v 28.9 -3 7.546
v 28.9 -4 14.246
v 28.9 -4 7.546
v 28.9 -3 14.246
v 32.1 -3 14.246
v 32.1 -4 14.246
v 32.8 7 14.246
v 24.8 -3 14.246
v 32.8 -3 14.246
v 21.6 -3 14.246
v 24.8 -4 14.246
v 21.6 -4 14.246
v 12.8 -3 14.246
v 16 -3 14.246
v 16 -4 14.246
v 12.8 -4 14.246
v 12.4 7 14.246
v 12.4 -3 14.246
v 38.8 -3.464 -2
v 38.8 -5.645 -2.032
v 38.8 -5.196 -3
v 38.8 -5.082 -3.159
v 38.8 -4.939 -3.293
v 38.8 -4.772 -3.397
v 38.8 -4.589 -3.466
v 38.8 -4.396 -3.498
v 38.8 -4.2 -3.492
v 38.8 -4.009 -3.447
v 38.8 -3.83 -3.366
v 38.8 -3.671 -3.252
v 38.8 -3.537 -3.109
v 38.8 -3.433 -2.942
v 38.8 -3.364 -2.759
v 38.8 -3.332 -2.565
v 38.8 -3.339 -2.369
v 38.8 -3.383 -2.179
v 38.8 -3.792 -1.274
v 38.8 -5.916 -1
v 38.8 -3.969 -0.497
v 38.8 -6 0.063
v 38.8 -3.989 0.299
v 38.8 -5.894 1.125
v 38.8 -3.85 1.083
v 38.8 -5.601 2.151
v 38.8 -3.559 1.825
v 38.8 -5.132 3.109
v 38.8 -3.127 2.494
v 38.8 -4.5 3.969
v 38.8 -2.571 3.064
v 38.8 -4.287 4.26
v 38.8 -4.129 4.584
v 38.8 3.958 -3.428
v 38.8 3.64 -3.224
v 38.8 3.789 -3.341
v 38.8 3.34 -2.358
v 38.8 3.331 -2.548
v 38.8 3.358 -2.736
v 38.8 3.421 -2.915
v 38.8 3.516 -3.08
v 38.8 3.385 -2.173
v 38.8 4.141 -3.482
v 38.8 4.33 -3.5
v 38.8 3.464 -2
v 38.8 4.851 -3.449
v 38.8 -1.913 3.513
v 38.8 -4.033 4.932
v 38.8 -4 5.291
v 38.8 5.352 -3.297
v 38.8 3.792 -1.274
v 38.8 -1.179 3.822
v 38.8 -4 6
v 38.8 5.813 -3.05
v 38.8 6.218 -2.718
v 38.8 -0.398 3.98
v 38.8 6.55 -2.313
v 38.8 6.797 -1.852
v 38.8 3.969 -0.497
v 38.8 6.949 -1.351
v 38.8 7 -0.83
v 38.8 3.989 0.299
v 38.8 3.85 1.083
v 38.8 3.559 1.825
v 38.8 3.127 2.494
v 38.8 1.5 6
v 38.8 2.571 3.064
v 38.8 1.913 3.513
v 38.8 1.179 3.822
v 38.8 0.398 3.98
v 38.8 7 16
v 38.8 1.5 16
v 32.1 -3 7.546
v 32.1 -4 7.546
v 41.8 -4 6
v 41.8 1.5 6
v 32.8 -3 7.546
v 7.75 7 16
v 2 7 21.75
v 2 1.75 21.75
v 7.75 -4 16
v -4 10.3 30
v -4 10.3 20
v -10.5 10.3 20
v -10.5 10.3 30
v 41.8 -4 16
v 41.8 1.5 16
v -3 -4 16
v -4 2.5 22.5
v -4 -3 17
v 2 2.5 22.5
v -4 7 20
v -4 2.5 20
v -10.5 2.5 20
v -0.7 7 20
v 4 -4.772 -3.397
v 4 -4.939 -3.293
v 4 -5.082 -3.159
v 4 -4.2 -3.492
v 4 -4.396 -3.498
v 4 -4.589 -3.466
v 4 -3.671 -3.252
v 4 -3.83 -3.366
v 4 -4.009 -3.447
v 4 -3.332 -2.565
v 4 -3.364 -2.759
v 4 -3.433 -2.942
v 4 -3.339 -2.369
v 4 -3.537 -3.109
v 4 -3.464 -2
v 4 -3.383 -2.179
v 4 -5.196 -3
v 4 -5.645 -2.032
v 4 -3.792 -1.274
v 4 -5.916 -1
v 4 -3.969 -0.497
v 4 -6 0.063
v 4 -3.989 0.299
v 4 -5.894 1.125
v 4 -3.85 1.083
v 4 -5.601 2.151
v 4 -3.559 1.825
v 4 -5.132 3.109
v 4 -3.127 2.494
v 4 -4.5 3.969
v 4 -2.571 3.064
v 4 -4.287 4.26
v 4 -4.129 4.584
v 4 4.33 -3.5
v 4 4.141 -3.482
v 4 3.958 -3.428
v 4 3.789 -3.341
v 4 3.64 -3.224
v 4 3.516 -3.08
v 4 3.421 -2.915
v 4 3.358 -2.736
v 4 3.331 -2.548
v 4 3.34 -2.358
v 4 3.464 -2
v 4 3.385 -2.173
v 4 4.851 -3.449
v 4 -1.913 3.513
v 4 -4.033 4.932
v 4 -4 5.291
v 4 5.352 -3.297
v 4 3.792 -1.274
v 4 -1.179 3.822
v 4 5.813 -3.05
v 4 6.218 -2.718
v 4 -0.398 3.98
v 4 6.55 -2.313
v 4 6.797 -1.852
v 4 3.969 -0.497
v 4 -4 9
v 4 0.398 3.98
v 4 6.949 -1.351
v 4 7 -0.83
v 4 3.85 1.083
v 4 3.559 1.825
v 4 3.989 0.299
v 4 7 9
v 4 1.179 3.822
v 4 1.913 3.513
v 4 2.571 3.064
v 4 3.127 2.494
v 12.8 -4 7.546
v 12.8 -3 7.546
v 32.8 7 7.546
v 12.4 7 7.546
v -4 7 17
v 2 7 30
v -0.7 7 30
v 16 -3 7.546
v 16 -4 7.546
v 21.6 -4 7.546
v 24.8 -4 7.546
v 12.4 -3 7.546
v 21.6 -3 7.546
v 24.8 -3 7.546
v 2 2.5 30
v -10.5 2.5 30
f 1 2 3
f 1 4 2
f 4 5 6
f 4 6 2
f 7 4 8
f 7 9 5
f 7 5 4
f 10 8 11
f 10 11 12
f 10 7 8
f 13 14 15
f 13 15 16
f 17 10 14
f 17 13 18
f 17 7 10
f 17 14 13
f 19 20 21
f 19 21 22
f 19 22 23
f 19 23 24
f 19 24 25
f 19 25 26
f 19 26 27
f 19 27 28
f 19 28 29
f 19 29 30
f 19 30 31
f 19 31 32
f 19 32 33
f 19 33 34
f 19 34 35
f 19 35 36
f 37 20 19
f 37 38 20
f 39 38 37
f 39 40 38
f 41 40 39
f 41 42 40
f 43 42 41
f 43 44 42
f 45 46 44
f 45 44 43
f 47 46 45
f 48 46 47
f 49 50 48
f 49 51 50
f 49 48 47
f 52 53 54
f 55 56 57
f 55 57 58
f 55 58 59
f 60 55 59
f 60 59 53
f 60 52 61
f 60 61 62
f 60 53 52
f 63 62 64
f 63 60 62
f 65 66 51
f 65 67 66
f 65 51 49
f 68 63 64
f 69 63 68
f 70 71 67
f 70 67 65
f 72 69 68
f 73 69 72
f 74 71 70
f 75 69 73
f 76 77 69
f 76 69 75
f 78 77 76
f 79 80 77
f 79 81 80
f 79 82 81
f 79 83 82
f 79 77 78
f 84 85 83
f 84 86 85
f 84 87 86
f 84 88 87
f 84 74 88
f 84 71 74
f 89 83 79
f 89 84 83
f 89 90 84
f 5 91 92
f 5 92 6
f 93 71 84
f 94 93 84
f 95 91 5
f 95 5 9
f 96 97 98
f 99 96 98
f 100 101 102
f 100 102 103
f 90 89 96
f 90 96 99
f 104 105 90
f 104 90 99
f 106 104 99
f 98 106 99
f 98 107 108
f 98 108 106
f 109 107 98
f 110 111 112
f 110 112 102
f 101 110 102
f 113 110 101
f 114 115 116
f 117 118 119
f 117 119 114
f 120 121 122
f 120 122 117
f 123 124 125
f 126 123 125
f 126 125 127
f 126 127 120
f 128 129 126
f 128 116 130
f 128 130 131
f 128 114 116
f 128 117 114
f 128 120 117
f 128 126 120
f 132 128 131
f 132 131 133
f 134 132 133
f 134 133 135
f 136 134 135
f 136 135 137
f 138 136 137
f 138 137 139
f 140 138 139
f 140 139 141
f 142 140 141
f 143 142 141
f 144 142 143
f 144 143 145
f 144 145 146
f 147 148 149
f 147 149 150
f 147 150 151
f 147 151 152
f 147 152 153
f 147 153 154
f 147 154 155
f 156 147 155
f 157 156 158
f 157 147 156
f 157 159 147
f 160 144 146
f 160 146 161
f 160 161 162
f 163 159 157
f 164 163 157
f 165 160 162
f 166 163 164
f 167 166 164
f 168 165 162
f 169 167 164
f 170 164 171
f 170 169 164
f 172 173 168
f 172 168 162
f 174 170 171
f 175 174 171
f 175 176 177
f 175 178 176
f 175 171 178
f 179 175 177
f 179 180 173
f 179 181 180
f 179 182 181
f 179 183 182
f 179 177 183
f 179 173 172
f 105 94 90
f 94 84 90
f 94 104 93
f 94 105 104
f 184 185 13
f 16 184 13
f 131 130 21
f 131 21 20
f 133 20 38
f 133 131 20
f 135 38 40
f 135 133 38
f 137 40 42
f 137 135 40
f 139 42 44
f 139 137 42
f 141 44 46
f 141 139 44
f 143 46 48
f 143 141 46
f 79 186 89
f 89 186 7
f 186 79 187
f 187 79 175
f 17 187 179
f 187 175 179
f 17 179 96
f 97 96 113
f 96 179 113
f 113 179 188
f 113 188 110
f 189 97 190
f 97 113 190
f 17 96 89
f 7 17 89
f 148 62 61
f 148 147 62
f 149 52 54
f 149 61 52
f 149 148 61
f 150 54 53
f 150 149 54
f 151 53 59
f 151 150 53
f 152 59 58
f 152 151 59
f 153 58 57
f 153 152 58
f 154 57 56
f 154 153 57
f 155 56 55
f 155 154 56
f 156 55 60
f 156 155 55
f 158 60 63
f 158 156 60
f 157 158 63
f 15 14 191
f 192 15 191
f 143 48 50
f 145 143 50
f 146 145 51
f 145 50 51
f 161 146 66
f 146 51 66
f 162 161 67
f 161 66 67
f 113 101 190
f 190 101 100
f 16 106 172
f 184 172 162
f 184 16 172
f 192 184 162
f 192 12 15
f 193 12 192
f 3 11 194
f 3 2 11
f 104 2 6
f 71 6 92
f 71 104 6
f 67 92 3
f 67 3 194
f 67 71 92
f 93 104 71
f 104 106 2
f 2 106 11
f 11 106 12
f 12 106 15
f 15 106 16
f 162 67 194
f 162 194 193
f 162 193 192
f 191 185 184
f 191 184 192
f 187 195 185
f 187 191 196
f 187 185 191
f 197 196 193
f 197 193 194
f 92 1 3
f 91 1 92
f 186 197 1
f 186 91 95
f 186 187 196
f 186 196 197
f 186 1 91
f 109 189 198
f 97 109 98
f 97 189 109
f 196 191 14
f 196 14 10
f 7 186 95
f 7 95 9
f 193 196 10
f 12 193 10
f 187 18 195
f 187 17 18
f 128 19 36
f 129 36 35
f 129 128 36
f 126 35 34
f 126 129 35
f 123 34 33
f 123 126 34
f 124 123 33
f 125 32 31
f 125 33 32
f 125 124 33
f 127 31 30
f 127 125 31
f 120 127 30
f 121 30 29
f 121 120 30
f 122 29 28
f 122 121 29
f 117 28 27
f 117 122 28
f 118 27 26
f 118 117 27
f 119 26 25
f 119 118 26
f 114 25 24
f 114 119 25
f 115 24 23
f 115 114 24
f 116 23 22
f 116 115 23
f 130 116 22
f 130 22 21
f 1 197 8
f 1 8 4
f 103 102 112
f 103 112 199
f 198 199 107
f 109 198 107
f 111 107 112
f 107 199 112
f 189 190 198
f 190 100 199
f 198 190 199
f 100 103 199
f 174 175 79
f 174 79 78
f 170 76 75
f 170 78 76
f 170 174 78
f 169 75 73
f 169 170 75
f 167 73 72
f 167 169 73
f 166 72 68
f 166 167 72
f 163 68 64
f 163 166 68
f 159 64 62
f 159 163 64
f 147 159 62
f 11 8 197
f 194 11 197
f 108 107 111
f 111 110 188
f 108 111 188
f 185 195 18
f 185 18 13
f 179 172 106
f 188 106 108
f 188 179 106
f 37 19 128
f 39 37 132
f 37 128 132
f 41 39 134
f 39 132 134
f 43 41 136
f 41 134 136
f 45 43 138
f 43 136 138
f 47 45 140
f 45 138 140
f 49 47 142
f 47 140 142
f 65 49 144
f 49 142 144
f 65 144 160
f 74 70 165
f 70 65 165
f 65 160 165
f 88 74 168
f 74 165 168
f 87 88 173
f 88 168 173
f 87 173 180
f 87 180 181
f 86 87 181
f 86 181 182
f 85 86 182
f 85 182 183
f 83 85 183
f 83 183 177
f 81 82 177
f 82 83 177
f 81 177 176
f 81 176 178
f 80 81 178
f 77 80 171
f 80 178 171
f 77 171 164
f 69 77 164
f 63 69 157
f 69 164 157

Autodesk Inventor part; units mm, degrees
ref_plane "YZ Plane" through (0, 0, 0) normal (1, 0, 0) x (0, 1, 0)
ref_plane "XZ Plane" through (0, 0, 0) normal (0, 1, 0) x (-1, 0, 0)
ref_plane "XY Plane" through (0, 0, 0) normal (0, 0, 1) x (1, 0, 0)
sketch "Sketch1" plane through (0, 0, 0) normal (1, 0, 0) x (0, 1, 0)
  arc A0 (3.4641, -2) -> (-3.4641, -2) centre (0, 0) ccw
  arc A1 (3.4641, -2) -> (5.1962, -3) centre (4.3301, -2.5) ccw
  arc A2 (-5.1962, -3) -> (-3.4641, -2) centre (-4.3301, -2.5) ccw
  line L0 (7, 16) -> (-4, 16)
  line L1 (-4, 16) -> (-4, 4.4721)
  line L2 (4.4721, 4) -> (7, 4)
  line L3 (7, 4) -> (7, 16)
  arc A3 (5.1962, -3) -> (5.8413, 1.3709) centre (0, 0) ccw
  arc A4 (-4, 4.4721) -> (-5.1962, -3) centre (0, 0) ccw
  line L4 (7, 4) -> (7, -0.8301)
  arc A5 (4.3301, -3.5) -> (7, -0.8301) centre (4.3301, -0.8301) ccw
  dimension "d0" = 8
  dimension "d4" = 2.5
  dimension "d5" = 7
  dimension "d6" = 12
  dimension "d7" = 11
  dimension "d34" = 6
  dimension "d35" = 6
extrude "Extrusion1" add sketch "Sketch1" along normal blind 38.8
fillet "Fillet1" radius 2 1 edges at (19.4, -4, 4.4721)
sketch "Sketch2" plane through (38.8, 0, 0) normal (1, 0, 0) x (0, 0, -1)
  line L0 (-16, -4) -> (-5.2915, -4) projected
  line L1 (-16, -4) -> (-6, -4)
  line L2 (-6, -4) -> (-6, 1.5)
  line L3 (-6, 1.5) -> (-16, 1.5)
  line L4 (-16, 1.5) -> (-16, -4)
  point P0 (0, 0)
  dimension "d11" = 10
  dimension "d12" = 5.5
extrude "Extrusion2" add sketch "Sketch2" along normal blind 3
sketch "Sketch3" plane through (0, 0, 0) normal (-1, 0, 0) x (0, 0, 1)
  point P0 (0, 0)
sketch "Sketch4" plane through (0, 0, 0) normal (-1, 0, 0) x (0, 0, 1)
  line L0 (16, -4) -> (6, -4)
  line L1 (6, -4) -> (6, 7)
  line L2 (6, 7) -> (16, 7)
  line L3 (16, 7) -> (16, -4)
  point P0 (0, 0)
  dimension "d15" = 10
  dimension "d16" = 11
extrude "Extrusion3" add sketch "Sketch4" along normal blind 4
sketch "Sketch8" plane through (-4, 0, 0) normal (-1, 0, 0) x (0, 0, 1)
  line L0 (20, 10.3) -> (30, 10.3)
  line L1 (30, 10.3) -> (30, 2.5)
  line L2 (30, 2.5) -> (20, 2.5)
  line L3 (20, 2.5) -> (20, 10.3)
  point P0 (0, 0)
  dimension "d26" = 7.8
  dimension "d27" = 10.3
  dimension "d28" = 20
  dimension "d29" = 10
extrude "Extrusion6" add sketch "Sketch8" along normal blind 6.5
sketch "Sketch9" plane through (-4, 0, 0) normal (1, 0, 0) x (0, 0, -1)
  line L0 (-30, 2.5) -> (-20, 2.5) projected
  line L1 (-16, 7) -> (-16, 1.5) projected
  line L2 (-30, 2.5) -> (-16, 2.5)
  line L3 (-16, 2.5) -> (-16, 7)
  line L4 (-16, 7) -> (-30, 7)
  line L5 (-30, 7) -> (-30, 2.5)
  point P0 (0, 0)
extrude "Extrusion7" add sketch "Sketch9" along normal blind 6
sketch "Sketch11" plane through (0, 7, 6) normal (0, 1, 0) x (1, 0, 0)
  line L0 (32.8, -8.2459) -> (12.4, -8.2459)
  line L1 (12.4, -8.2459) -> (12.4, -1.5459)
  line L2 (12.4, -1.5459) -> (32.8, -1.5459)
  line L3 (32.8, -1.5459) -> (32.8, -8.2459)
  line L4 (38.8, 6.8301) -> (38.8, -10) projected
  point P0 (0, 6)
  point P1 (38.8, 2)
  dimension "d47" = 20.4
  dimension "d48" = 6.7
  dimension "d67" = 6
extrude "Extrusion9" cut sketch "Sketch11" against normal blind 10
sketch "Sketch12" plane through (0, -3, 6) normal (0, 1, 0) x (1, 0, 0)
  line L0 (11.9901, -47.107) -> (11.9901, -26.707)
  line L1 (18.6901, -26.707) -> (18.6901, -47.107)
  line L2 (11.9901, -46.407) -> (18.6901, -46.407)
  line L3 (18.6901, -46.407) -> (18.6901, -43.207)
  line L4 (18.6901, -43.207) -> (11.9901, -43.207)
  line L5 (11.9901, -43.207) -> (11.9901, -46.407)
  line L6 (11.9901, -39.107) -> (18.6901, -39.107)
  line L7 (18.6901, -39.107) -> (18.6901, -35.907)
  line L8 (18.6901, -35.907) -> (11.9901, -35.907)
  line L9 (11.9901, -35.907) -> (11.9901, -39.107)
  line L10 (11.9901, -30.307) -> (18.6901, -30.307)
  line L11 (18.6901, -30.307) -> (18.6901, -27.107)
  line L12 (18.6901, -27.107) -> (11.9901, -27.107)
  line L13 (11.9901, -27.107) -> (11.9901, -30.307)
  line L14 (18.6901, -47.107) -> (11.9901, -47.107)
  line L15 (11.9901, -26.707) -> (18.6901, -26.707)
  line L16 (32.8, -8.2459) -> (12.4, -8.2459) projected
  line L17 (12.4, -1.5459) -> (32.8, -1.5459) projected
  line L18 (12.8, -8.2459) -> (16, -8.2459)
  line L19 (16, -8.2459) -> (16, -1.5459)
  line L20 (16, -1.5459) -> (12.8, -1.5459)
  line L21 (12.8, -1.5459) -> (12.8, -8.2459)
  line L22 (21.6, -8.2459) -> (24.8, -8.2459)
  line L23 (24.8, -8.2459) -> (24.8, -1.5459)
  line L24 (24.8, -1.5459) -> (21.6, -1.5459)
  line L25 (21.6, -1.5459) -> (21.6, -8.2459)
  line L26 (32.1, -8.2459) -> (28.9, -8.2459)
  line L27 (28.9, -8.2459) -> (28.9, -1.5459)
  line L28 (28.9, -1.5459) -> (32.1, -1.5459)
  line L29 (32.1, -1.5459) -> (32.1, -8.2459)
  line L30 (12.4, -8.2459) -> (12.4, -1.5459) projected
  point P0 (0, 6)
  point P1 (15.3401, -24.907)
  point P2 (11.9901, -44.807)
  point P3 (11.9901, -37.507)
  point P4 (11.9901, -28.707)
  point P5 (14.4, -8.2459)
  point P6 (23.2, -8.2459)
  point P7 (30.5, -8.2459)
  dimension "d51" = 7.3
  dimension "d52" = 8.8
  dimension "d53" = 3.2
  dimension "d54" = 3.2
  dimension "d55" = 3.2
  dimension "d56" = 2
  dimension "d59" = 3.2
  dimension "d60" = 3.2
  dimension "d61" = 3.2
  dimension "d62" = 8.8
  dimension "d63" = 7.3
  dimension "d64" = 2
extrude "Extrusion10" cut sketch "Sketch12" against normal blind 10 contours L16 L27 L17 L29 | L16 L25 L17 L23 | L16 L21 L17 L19
sketch "Sketch13" plane through (0, 0, 0) normal (-1, 0, 0) x (0, 0, 1)
  line L0 (-8.6099, 16.8376) -> (10, 16.8376)
  line L1 (10, -12.4202) -> (-8.6099, -12.4202)
  line L2 (-8.6099, -12.4202) -> (-8.6099, 16.8376)
  line L3 (10, 16.8376) -> (10, -12.4202)
  line L4 (16, -4) -> (16, 2.5) projected
  point P0 (0, 0)
  point P1 (16, 0.5)
  dimension "d70" = 6
extrude "Extrusion11" cut sketch "Sketch13" along normal mid plane 8
chamfer "Chamfer1" distance 4 angle 45 2 edges at (4, 1.5, 10) (-4, 1.5, 10)
chamfer "Chamfer2" distance 5.75 angle 45 1 edges at (2, 4.75, 16)
chamfer "Chamfer3" distance 3.3 angle 45 1 edges at (-4, 7, 25)
chamfer "Chamfer4" distance 6.5 angle 45 2 edges at (4.875, 2.5, 16) (-1, 2.5, 16)
sketch "Sketch14" plane through (38.8, 7, 16) normal (0, 1, 0) x (1, 0, 0)
  line L0 (-34.8, 10) -> (-34.8, 10.7085) projected
  line L1 (-34.8, 10) -> (-34.8, 7)
  line L2 (-34.8, 7) -> (-42.8, -1)
  line L3 (-42.8, 2) -> (-42.8, -4) projected
  line L4 (-42.8, 2) -> (-34.8, 10) projected
  line L5 (-42.8, 2) -> (-42.8, -1)
  line L6 (-42.8, 2) -> (-34.8, 10)
  line L7 (-42.8, -4) -> (-49.3, -4) projected
  point P0 (-38.8, 16)
  dimension "d85" = 3
extrude "Extrusion12" cut sketch "Sketch14" against normal blind 15
sketch "Sketch15" plane through (-10.5, 2.5, 30) normal (0, 0, 1) x (1, 0, 0)
  line L0 (0, 0) -> (12.5, 0) projected
  line L1 (6.5, -2.5) -> (6.5, -5.5) projected
  line L2 (0, 0) -> (6.5, 0)
  line L3 (6.5, 0) -> (6.5, -5.5)
  line L4 (6.5, -5.5) -> (0, -5.5)
  line L5 (0, -5.5) -> (0, 0)
  point P0 (10.5, -2.5)
extrude "Extrusion13" cut sketch "Sketch15" against normal blind 30.25
properties part number "30_Switch"
